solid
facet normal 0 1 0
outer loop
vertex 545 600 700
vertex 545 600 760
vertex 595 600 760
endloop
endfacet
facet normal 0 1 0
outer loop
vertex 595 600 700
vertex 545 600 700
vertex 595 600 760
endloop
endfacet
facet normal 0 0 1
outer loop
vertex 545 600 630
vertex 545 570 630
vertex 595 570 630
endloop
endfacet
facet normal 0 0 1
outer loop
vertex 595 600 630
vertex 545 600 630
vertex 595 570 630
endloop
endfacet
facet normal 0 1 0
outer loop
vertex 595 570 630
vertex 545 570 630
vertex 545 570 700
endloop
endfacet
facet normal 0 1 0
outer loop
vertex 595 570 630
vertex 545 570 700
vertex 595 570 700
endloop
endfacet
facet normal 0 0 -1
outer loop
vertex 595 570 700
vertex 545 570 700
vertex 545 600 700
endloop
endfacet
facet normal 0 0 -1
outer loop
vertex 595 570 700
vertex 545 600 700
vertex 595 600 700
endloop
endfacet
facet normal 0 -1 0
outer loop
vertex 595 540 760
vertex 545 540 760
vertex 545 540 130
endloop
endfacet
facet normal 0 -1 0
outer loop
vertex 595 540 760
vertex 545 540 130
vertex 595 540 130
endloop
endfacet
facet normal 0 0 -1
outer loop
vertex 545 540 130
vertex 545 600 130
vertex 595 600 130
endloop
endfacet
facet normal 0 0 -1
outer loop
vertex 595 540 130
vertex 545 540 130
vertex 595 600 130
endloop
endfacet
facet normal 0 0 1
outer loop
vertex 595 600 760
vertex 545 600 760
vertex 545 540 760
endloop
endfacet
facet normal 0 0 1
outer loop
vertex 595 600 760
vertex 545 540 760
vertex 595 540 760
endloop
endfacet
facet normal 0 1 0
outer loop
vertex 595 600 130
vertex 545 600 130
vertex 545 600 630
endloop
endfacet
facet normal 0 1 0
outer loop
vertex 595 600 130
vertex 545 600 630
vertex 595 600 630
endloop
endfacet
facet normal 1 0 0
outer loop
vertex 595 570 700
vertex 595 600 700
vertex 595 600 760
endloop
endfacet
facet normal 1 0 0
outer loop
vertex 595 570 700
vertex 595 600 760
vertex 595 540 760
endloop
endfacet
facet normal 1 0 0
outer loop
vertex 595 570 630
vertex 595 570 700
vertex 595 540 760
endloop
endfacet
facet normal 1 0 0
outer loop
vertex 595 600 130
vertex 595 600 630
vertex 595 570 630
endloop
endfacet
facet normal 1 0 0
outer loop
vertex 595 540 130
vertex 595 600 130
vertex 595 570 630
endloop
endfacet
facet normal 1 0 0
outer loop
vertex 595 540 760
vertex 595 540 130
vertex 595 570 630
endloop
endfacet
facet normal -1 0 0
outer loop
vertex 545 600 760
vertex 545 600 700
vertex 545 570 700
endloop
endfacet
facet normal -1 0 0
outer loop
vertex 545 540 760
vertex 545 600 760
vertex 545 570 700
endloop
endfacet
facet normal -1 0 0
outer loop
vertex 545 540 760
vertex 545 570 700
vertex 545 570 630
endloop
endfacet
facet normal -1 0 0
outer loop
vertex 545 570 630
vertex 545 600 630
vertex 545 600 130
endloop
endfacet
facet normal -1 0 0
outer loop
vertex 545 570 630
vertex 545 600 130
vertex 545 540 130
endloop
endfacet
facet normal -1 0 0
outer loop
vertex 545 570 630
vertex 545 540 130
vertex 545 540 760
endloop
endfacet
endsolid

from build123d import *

# Parameters (mm, degrees)
SKETCH006_W      = 50
SKETCH006_H      = 30
EXTRUDE006_DEPTH = 70
SKETCH007_W      = 50
SKETCH007_H      = 60
EXTRUDE007_DEPTH = 60
SKETCH005_W      = 50
SKETCH005_H      = 60
EXTRUDE005_DEPTH = 500


with BuildPart() as montante_corte:
    # Sketch006 (on Face6 of Extrude005) → Extrude006 (new body)
    with BuildSketch(Plane.XY.offset(630)):
        with Locations((570, 45)):
            Rectangle(SKETCH006_W, SKETCH006_H)
    extrude(amount=EXTRUDE006_DEPTH)


with BuildPart() as montante_cabeca:
    # Sketch007 (on Face6 of Extrude006) → Extrude007 (new body)
    with BuildSketch(Plane.XY.offset(700)):
        with Locations((570, 30)):
            Rectangle(SKETCH007_W, SKETCH007_H)
    extrude(amount=EXTRUDE007_DEPTH)


with BuildPart() as fusion:
    # Sketch005 (on Face14 of Extrude004) → Extrude005 (new body)
    with BuildSketch(Plane.XY.offset(130)):
        with Locations((570, 30)):
            Rectangle(SKETCH005_W, SKETCH005_H)
    extrude(amount=EXTRUDE005_DEPTH)

    # Fusion: union Montante-corte, Montante-cabeca
    add(montante_corte.part)
    add(montante_cabeca.part)


with BuildPart() as fusion_mirrored:
    # mirror: instance of Fusion
    add(fusion.part.mirror(Plane(origin=(1140, 300, 120), x_dir=(1, 0, 0), z_dir=(0, 1, 0))))


solid = fusion_mirrored.part
